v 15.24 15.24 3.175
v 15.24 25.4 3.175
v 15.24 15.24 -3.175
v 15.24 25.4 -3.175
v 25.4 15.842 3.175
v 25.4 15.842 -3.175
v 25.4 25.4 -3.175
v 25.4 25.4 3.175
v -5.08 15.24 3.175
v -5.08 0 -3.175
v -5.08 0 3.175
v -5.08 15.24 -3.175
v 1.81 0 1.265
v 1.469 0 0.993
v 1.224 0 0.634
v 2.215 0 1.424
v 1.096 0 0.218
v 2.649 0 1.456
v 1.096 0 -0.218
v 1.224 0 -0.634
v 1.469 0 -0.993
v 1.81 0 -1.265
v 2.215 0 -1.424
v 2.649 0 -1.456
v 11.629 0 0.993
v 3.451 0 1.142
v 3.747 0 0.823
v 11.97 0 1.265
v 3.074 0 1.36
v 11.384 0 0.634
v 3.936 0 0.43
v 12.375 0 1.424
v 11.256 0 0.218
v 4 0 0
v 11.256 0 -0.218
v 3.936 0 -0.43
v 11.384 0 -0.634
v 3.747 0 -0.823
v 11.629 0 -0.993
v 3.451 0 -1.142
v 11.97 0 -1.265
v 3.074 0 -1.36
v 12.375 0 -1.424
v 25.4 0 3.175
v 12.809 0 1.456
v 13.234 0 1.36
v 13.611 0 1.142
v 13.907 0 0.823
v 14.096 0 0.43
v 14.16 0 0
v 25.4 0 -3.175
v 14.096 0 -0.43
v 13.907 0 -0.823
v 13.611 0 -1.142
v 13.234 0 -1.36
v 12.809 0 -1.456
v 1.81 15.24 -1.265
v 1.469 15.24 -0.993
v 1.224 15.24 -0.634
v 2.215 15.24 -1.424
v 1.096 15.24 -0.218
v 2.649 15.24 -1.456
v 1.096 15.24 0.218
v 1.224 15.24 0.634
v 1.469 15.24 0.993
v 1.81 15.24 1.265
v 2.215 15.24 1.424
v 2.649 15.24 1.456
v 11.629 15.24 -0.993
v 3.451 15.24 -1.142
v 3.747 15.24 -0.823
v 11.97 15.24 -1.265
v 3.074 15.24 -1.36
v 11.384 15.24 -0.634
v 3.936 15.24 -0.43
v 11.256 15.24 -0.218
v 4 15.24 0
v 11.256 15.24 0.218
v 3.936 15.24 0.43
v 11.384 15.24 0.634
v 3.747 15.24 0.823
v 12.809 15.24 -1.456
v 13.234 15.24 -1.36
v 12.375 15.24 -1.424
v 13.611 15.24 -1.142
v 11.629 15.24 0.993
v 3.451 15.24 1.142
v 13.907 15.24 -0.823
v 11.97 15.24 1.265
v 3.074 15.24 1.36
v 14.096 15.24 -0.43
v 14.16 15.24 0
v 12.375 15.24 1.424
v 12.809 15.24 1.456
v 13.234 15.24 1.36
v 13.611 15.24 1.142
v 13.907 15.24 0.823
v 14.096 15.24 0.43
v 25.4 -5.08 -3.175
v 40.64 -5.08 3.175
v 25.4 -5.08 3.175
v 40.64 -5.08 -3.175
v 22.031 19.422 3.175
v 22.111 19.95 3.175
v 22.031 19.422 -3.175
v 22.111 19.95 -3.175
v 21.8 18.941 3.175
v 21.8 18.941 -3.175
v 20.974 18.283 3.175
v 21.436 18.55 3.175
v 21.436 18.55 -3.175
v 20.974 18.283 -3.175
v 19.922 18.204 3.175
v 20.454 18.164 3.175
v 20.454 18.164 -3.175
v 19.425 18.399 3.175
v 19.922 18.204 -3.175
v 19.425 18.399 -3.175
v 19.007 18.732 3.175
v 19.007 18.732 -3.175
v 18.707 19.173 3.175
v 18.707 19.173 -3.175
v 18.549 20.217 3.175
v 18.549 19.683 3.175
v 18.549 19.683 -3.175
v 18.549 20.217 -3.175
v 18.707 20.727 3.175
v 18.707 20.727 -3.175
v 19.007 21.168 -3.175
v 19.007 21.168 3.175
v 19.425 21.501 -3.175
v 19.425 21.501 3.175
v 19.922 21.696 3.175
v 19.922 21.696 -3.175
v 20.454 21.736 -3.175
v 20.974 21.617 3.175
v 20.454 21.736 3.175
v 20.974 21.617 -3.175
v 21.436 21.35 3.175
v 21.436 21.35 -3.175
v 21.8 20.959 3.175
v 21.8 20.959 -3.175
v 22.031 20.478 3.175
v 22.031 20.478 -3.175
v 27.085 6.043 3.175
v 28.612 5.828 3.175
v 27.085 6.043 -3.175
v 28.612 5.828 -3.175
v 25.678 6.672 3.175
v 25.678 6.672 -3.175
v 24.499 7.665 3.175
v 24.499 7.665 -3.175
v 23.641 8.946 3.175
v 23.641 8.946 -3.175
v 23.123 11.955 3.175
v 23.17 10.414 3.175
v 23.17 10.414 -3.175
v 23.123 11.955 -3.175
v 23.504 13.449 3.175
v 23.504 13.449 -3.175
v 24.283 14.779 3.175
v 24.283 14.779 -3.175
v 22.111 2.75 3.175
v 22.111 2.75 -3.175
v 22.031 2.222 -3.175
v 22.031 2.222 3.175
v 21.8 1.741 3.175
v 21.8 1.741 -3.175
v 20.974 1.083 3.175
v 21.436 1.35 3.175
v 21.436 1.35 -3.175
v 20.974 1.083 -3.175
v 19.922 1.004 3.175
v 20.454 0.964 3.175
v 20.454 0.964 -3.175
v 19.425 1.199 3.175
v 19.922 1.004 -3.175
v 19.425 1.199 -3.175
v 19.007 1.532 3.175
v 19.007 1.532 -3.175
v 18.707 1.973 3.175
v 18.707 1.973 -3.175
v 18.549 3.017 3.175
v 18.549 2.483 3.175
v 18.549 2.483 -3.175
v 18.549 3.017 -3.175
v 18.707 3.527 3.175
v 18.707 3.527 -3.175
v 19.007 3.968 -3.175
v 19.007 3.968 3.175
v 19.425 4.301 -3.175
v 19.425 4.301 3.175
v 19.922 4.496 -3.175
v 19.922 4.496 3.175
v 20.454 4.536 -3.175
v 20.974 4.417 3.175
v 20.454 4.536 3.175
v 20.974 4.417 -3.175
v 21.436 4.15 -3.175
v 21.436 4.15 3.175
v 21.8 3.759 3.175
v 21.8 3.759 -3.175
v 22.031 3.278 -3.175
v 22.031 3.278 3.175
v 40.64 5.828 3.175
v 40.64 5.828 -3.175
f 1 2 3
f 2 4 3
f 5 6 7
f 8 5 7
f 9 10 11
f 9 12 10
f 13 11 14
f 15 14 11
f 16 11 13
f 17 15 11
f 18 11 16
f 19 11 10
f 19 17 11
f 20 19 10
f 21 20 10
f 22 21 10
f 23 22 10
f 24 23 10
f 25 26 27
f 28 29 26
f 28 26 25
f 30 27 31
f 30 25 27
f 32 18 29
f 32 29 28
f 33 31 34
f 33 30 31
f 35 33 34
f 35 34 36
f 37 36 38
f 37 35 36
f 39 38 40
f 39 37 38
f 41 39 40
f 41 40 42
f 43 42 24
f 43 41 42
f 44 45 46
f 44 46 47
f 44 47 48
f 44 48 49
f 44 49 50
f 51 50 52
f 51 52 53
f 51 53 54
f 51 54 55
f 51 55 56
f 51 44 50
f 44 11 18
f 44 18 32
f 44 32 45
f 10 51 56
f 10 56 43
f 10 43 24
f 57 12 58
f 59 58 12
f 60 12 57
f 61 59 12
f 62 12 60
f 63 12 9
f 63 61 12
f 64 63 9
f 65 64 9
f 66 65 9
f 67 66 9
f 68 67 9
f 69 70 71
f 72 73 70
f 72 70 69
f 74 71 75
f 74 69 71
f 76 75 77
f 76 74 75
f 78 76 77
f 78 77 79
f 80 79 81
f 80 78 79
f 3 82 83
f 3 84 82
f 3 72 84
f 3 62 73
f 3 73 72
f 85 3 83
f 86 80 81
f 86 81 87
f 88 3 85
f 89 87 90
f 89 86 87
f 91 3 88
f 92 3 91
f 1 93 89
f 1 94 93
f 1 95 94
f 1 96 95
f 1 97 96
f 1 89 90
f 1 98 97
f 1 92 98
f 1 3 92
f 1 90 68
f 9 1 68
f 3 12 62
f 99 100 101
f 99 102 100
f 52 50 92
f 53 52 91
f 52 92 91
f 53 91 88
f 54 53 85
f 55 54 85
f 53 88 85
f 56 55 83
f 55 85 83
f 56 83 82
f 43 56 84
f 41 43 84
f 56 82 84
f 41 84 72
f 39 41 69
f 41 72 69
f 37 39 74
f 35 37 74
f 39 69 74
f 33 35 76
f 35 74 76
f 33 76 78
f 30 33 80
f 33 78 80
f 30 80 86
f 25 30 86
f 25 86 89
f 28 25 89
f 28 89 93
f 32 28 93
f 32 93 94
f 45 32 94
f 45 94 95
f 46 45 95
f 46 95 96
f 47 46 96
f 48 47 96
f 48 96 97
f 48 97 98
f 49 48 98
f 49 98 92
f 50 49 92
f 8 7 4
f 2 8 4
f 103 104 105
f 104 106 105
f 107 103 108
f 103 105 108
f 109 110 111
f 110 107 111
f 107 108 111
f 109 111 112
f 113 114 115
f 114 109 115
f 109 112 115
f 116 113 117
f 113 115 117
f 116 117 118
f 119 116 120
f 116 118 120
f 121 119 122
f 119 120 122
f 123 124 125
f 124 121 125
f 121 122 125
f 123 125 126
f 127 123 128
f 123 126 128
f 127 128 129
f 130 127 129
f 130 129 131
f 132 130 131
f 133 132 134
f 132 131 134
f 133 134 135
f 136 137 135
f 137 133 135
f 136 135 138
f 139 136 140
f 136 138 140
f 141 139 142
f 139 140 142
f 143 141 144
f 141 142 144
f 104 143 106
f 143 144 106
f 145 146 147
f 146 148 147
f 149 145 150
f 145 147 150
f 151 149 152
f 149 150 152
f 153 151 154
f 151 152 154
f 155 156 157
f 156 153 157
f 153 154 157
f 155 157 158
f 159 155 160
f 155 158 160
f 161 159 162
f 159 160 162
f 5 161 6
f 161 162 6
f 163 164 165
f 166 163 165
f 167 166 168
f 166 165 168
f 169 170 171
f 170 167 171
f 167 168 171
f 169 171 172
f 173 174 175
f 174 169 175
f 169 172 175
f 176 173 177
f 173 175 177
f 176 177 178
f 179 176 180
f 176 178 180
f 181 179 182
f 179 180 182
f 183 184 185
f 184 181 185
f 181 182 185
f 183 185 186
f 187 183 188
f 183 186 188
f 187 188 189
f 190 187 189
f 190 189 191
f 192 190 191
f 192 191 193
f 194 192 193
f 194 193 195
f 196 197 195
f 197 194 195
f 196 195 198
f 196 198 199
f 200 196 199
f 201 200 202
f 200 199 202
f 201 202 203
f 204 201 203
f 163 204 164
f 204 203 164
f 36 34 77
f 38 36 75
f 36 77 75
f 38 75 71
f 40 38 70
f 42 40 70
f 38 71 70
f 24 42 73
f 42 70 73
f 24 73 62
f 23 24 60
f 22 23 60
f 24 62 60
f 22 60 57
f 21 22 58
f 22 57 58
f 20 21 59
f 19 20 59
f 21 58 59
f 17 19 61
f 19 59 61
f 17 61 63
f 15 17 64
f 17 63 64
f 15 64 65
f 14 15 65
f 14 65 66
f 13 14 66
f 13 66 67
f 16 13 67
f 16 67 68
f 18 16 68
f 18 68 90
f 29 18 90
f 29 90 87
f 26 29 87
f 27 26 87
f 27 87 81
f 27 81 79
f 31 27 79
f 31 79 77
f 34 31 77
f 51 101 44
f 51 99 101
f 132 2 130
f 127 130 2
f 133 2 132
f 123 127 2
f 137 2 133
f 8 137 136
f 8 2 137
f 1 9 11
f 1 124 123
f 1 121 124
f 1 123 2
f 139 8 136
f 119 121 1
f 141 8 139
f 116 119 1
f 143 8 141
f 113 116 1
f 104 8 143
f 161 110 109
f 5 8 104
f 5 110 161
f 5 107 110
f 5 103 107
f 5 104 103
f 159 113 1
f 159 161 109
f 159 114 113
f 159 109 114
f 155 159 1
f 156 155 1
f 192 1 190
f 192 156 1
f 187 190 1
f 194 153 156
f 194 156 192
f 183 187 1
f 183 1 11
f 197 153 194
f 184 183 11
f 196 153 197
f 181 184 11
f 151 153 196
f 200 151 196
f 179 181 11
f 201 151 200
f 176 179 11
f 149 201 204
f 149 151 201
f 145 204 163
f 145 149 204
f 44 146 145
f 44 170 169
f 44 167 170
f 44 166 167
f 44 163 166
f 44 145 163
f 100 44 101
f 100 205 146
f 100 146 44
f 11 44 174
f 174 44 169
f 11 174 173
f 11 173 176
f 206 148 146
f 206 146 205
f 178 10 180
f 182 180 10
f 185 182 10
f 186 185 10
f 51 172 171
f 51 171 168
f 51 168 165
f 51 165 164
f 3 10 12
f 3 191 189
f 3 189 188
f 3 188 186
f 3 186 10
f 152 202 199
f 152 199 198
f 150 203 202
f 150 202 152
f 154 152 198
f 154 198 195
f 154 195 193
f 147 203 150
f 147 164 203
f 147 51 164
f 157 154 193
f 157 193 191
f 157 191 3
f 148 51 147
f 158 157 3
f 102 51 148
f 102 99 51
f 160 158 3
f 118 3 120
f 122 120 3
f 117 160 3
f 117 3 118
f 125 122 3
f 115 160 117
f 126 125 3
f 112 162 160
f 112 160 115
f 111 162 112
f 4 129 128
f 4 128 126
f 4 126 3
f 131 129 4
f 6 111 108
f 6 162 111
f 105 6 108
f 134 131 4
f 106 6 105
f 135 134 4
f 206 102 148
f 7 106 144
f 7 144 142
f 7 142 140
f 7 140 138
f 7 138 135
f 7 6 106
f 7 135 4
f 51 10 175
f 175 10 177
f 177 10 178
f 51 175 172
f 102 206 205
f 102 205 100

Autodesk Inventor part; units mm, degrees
ref_plane "YZ Plane" through (0, 0, 0) normal (1, 0, 0) x (0, 1, 0)
ref_plane "XZ Plane" through (0, 0, 0) normal (0, 1, 0) x (-1, 0, 0)
ref_plane "XY Plane" through (0, 0, 0) normal (0, 0, 1) x (1, 0, 0)
sketch "Sketch1" plane through (0, 0, 0) normal (0, 0, 1) x (1, 0, 0)
  line L0 (0, 0) -> (25.4, 0)
  line L1 (25.4, 25.4) -> (15.24, 25.4)
  line L2 (15.24, 25.4) -> (15.24, 15.24)
  line L3 (15.24, 15.24) -> (0, 15.24)
  line L4 (0, 15.24) -> (0, 0)
  line L5 (20.32, 25.4) -> (20.32, 0) construction
  circle A0 centre (20.32, 2.75) radius 1.7907
  circle A1 centre (20.32, 19.95) radius 1.7907
  arc A2 (25.4, 15.8417) -> (28.612, 5.828) centre (28.612, 11.35) ccw
  line L6 (40.64, -5.08) -> (25.4, -5.08)
  line L7 (25.4, -5.08) -> (25.4, 0)
  line L8 (25.4, 0) -> (25.4, 6.8583) construction
  line L9 (25.4, 15.8417) -> (25.4, 25.4)
  line L10 (28.612, 5.828) -> (40.64, 5.828)
  line L11 (40.64, 5.828) -> (40.64, -5.08)
  dimension "d0" = 25.4
  dimension "d1" = 25.4
  dimension "d2" = 10.16
  dimension "d3" = 10.16
  dimension "d4" = 3.5814
  dimension "d6" = 2.75
  dimension "d7" = 3.5814
  dimension "d17" = 17.2
  dimension "d18" = 11.044
  dimension "d20" = 11.35
  dimension "d21" = 8.292
  dimension "d24" = 15.24
  dimension "d25" = 5.08
  dimension "d26" = 15.24
extrude "Extrusion1" add sketch "Sketch1" along normal mid plane 6.35
sketch "Sketch2" plane through (0, 15.24, 3.175) normal (0, 1, 0) x (1, 0, 0)
  line L0 (0, 3.175) -> (15.24, 3.175) construction
  line L1 (15.24, 6.35) -> (15.24, 0) projected
  circle A0 centre (2.54, 3.175) radius 1.4605
  circle A1 centre (12.7, 3.175) radius 1.4605
  line L2 (0, 6.35) -> (0, 0) projected
  dimension "d11" = 2.921
  dimension "d12" = 2.921
  dimension "d13" = 2.54
  dimension "d14" = 12.7
extrude "Extrusion2" cut sketch "Sketch2" against normal up to next
sketch "Sketch4" plane through (25.4, -5.08, 3.175) normal (0, -1, 0) x (1, 0, 0)
  circle A0 centre (-22.86, -3.175) radius 1.4605 projected
  circle A1 centre (-12.7, -3.175) radius 1.4605 projected
  line L0 (0, -6.35) -> (0, 0) projected
  line L1 (-25.4, 0) -> (0, 0) projected
  line L2 (-25.4, 0) -> (-25.4, -6.35) projected
  line L3 (0, -6.35) -> (-25.4, -6.35) projected
  line L4 (15.24, -6.35) -> (15.24, 0) projected
  line L5 (0, 0) -> (15.24, 0) projected
  line L6 (0, -6.35) -> (0, 0) projected
  line L7 (15.24, -6.35) -> (0, -6.35) projected
  point P0 (-25.4, -3.175)
sketch "Sketch5" plane through (0, 0, 3.175) normal (-1, 0, 0) x (0, 0, 1)
  line L0 (0, 0) -> (-6.35, 0) projected
  line L1 (0, 15.24) -> (0, 0) projected
  line L2 (-6.35, 15.24) -> (0, 15.24) projected
  line L3 (-6.35, 0) -> (-6.35, 15.24) projected
  point P0 (-3.175, 0)
extrude "Extrusion3" add sketch "Sketch5" along normal blind 5.08
sketch "Sketch6" plane through (0, 0, -3.175) normal (0, 0, -1) x (-1, 0, 0)
  circle A0 centre (-20.32, 19.95) radius 1.7907 projected
  circle A1 centre (-20.32, 2.75) radius 1.7907 projected
  line L0 (-25.4, 0) -> (5.08, 0) projected
  line L1 (5.08, 15.24) -> (5.08, 0) projected
  line L2 (-15.24, 15.24) -> (5.08, 15.24) projected
  line L3 (-15.24, 15.24) -> (-15.24, 25.4) projected
  line L4 (-15.24, 25.4) -> (-25.4, 25.4) projected
  line L5 (-25.4, 25.4) -> (-25.4, 15.8417) projected
  arc A2 (-28.612, 5.828) -> (-25.4, 15.8417) centre (-28.612, 11.35) ccw projected
  line L6 (-28.612, 5.828) -> (-40.64, 5.828) projected
  line L7 (-40.64, 5.828) -> (-40.64, -5.08) projected
  line L8 (-40.64, -5.08) -> (-25.4, -5.08) projected
  line L9 (-25.4, -5.08) -> (-25.4, 0) projected
  line L10 (-11.2395, 15.24) -> (-11.2395, 0) projected
  line L11 (-11.2395, 15.24) -> (-11.2395, 0)
  line L12 (-14.1605, 15.24) -> (-11.2395, 15.24) projected
  line L13 (-14.1605, 15.24) -> (-14.1605, 0)
  line L14 (-25.4, 0) -> (5.08, 0) projected
  line L15 (-4.0005, 15.24) -> (-1.0795, 15.24) projected
  line L16 (-1.0795, 15.24) -> (-1.0795, 0)
  line L17 (-4.0005, 15.24) -> (-4.0005, 0)
  line L18 (-4.0005, 15.24) -> (-4.0005, 0) projected
properties part number "MotorHolder 2"
